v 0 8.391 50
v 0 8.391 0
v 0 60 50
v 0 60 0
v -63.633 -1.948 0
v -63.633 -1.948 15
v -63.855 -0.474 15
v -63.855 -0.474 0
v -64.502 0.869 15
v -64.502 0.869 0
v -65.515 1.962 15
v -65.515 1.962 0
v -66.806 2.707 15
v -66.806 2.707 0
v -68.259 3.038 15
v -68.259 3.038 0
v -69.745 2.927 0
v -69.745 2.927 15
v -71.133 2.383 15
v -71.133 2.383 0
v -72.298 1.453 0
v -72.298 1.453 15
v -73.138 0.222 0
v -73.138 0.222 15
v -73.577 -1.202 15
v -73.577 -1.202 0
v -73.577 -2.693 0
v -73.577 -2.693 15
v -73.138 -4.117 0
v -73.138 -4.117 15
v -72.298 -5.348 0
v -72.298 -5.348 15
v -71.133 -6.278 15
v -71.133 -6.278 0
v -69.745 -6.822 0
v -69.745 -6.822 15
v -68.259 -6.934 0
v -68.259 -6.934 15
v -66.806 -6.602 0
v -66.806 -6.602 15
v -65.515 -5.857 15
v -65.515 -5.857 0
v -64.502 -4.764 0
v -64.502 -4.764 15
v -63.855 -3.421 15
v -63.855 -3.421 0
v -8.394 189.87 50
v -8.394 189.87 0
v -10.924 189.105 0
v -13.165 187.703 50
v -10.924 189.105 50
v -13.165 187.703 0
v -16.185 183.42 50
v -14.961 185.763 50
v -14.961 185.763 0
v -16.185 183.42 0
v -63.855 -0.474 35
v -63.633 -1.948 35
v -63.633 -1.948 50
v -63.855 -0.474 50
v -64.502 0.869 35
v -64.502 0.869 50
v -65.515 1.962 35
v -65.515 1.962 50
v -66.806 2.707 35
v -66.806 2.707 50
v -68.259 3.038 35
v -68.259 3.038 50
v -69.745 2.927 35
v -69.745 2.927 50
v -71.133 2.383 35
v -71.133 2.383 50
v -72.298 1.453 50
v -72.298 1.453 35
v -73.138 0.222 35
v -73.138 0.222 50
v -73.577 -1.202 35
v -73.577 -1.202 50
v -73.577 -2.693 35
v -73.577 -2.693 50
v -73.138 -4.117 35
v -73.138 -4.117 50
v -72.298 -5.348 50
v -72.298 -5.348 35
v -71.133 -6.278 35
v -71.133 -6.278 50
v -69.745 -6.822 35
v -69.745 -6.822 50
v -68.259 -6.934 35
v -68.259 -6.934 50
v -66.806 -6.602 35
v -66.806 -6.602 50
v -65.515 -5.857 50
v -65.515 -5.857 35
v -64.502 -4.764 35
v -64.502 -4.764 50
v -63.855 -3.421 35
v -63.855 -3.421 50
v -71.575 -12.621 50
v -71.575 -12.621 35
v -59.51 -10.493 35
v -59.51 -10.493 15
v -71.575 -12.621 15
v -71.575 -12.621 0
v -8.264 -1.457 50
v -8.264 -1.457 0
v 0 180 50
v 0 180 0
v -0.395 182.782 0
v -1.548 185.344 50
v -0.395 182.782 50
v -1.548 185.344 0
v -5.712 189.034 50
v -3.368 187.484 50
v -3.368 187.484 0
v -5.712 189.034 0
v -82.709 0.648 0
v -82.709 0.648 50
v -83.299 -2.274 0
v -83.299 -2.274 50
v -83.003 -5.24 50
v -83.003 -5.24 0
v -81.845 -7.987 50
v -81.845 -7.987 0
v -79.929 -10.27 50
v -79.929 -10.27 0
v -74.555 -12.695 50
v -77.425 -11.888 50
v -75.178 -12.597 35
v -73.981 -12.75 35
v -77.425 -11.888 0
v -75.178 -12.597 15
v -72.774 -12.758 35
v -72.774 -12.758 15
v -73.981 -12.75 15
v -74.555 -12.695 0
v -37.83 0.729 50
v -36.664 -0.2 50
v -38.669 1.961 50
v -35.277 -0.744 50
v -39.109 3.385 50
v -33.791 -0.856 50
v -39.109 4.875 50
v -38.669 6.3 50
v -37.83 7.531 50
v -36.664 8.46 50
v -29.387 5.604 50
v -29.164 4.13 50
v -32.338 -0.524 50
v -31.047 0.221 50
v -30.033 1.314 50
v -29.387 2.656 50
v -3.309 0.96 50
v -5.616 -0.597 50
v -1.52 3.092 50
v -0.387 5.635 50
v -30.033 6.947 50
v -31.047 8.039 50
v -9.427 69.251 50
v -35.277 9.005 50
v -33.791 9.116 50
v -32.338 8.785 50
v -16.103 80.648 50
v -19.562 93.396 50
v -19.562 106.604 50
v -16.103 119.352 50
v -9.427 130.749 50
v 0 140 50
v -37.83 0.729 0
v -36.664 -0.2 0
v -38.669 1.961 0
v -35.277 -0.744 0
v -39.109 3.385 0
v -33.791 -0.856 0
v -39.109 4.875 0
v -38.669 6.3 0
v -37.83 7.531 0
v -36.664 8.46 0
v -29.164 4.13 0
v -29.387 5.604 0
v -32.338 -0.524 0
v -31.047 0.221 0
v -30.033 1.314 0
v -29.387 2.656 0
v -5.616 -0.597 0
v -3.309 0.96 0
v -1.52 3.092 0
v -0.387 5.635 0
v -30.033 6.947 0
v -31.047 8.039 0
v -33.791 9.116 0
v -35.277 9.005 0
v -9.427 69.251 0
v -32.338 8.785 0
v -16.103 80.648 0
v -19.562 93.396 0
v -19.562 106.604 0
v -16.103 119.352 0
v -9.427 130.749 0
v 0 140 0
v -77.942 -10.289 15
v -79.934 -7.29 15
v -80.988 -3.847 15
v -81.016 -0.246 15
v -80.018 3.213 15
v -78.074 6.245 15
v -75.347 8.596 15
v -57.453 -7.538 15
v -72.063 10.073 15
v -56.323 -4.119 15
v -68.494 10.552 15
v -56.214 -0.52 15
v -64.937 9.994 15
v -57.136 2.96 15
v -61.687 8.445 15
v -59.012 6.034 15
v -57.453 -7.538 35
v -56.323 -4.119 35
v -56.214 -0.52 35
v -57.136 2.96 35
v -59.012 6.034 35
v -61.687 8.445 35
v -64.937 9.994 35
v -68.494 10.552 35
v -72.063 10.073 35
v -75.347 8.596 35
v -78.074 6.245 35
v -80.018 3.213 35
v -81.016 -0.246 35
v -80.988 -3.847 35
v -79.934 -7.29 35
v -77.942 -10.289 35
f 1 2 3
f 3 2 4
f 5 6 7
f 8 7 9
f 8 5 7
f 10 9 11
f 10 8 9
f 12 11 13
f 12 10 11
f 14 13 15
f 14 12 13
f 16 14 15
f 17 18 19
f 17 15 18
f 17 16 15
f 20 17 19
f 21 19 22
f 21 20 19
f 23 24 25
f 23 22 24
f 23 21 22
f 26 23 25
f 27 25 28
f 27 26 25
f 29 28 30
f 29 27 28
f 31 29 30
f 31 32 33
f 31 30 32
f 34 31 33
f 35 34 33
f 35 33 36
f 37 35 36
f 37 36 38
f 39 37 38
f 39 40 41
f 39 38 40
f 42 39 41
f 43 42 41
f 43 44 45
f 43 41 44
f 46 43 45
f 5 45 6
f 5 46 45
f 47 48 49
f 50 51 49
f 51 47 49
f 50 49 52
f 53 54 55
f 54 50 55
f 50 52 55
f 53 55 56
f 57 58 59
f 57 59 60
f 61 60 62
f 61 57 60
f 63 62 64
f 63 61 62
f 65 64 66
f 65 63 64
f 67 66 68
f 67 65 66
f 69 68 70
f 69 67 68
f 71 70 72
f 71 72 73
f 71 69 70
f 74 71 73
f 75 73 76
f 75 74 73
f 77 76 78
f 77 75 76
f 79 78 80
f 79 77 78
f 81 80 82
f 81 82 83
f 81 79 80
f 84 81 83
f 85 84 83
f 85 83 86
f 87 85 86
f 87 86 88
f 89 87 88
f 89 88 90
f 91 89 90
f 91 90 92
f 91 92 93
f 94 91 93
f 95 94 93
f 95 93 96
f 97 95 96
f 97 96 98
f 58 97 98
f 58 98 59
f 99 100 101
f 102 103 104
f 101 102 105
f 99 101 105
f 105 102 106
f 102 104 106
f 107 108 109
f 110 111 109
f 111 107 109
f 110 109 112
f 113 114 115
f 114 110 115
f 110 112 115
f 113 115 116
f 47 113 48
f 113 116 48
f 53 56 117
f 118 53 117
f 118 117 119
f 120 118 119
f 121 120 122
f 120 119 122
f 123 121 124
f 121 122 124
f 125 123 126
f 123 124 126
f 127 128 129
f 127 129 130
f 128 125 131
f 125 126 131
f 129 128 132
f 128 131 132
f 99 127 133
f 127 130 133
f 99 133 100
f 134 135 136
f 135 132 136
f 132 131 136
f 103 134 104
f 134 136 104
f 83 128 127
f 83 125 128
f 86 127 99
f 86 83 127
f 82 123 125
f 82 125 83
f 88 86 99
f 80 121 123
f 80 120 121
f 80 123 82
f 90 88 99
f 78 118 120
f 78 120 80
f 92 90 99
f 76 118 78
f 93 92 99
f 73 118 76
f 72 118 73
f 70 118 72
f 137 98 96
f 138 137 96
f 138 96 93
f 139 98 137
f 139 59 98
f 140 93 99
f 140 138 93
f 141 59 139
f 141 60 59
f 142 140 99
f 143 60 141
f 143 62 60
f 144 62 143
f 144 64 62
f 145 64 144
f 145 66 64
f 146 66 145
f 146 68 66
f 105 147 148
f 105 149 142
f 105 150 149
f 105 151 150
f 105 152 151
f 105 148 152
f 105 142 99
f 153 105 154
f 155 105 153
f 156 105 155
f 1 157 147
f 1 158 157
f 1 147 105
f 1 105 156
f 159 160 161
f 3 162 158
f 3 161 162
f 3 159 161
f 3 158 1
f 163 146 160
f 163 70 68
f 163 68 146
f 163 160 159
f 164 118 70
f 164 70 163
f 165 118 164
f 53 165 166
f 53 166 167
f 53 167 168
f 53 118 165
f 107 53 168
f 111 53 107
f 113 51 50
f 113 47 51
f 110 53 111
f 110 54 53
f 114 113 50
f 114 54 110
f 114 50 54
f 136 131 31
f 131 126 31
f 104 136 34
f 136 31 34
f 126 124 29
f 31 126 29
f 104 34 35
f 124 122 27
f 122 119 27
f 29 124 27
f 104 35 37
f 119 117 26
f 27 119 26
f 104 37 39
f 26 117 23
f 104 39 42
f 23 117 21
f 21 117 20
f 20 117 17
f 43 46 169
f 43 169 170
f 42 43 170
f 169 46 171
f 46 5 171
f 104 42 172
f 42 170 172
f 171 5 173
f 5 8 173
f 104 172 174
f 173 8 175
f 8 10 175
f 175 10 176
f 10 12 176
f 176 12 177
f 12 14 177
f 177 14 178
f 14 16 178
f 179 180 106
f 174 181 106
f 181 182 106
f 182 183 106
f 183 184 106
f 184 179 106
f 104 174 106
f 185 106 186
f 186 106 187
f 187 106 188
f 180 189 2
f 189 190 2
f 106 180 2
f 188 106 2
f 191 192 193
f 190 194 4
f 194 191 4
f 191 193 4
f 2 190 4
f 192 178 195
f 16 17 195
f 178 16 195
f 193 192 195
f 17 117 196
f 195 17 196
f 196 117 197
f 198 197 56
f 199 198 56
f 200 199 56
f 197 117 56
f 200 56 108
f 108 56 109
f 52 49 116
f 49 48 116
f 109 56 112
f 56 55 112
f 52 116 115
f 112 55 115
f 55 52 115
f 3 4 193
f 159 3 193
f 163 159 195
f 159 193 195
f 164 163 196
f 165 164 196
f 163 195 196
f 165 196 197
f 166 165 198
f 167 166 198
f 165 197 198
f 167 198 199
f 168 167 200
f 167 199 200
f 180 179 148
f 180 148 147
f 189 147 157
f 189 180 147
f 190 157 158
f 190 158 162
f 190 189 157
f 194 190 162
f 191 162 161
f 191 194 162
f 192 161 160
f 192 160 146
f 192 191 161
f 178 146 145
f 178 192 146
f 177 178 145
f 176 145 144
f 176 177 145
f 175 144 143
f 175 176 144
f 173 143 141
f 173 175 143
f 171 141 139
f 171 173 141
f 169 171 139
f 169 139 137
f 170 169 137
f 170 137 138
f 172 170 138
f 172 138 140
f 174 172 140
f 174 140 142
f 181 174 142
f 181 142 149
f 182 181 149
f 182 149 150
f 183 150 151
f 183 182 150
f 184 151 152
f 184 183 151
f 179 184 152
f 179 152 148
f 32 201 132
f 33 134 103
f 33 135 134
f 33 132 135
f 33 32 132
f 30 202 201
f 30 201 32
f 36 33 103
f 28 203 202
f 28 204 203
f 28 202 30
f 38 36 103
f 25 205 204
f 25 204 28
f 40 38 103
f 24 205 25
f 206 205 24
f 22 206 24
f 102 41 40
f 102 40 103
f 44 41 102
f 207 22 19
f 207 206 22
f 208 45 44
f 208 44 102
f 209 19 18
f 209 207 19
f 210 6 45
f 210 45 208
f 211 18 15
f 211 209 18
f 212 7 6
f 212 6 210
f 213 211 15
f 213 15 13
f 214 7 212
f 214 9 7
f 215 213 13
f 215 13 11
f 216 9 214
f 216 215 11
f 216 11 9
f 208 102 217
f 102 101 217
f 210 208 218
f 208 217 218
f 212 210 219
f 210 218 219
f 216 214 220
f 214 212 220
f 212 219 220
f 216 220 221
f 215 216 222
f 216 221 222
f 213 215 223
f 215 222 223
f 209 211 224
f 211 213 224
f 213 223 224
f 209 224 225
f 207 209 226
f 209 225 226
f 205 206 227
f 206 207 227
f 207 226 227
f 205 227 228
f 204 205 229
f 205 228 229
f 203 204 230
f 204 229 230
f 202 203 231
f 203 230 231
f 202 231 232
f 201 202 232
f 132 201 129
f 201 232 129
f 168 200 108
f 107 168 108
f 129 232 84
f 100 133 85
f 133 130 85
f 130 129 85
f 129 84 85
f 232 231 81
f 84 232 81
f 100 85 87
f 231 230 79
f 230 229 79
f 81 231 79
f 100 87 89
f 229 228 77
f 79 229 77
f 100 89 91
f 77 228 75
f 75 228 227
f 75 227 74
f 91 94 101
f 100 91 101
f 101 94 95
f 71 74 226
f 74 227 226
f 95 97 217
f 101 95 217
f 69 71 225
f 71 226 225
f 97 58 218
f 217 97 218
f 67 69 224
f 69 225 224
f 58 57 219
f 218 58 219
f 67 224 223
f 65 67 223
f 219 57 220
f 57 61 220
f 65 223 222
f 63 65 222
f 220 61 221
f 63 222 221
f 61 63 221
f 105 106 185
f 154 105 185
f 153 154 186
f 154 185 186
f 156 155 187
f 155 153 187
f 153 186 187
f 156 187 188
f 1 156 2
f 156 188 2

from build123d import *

# Parameters (mm, degrees)
SKETCH1_R           = 5
BOSS_EXTRUDE1_DEPTH = 50
FILLET2_R           = 10
SKETCH2_R           = 12.5
CUT_EXTRUDE2_DEPTH  = 10


with BuildPart() as part:
    # Sketch1 → Boss-Extrude1 (new body)
    with BuildSketch(Plane.XY):
        with BuildLine():
            Line((0, 0), (0, 60))
            ThreePointArc((0, 60), (-20, 100), (0, 140))
            Line((0, 140), (0, 190))
            Line((0, 190), (-13.790104149, 190))
            Line((-13.790104149, 190), (-88.632697771, -15.62833599))
            Line((-88.632697771, -15.62833599), (0, 0))
        make_face()
        with Locations((-68.632697771, -1.947530257)):
            Circle(SKETCH1_R, mode=Mode.SUBTRACT)
        with Locations((-34.164426416, 4.130155961)):
            Circle(SKETCH1_R, mode=Mode.SUBTRACT)
    extrude(amount=BOSS_EXTRUDE1_DEPTH)

    # Fillet2
    # the kernel refuses this fillet: 10 mm, written as the material it takes off along each edge
    with BuildSketch(Plane(origin=(0, 0, -20.977490779), x_dir=(0, 1, 0), z_dir=(0, 0, 1))) as fillet2_piece_1:
        with BuildLine():
            CenterArc((FILLET2_R * 0.839099631177, FILLET2_R), FILLET2_R, 190, 80)
            Line((-FILLET2_R * 0.145708121835, FILLET2_R * 0.826351822333), (0, 0))
            Line((0, 0), (FILLET2_R * 0.839099631177, 0))
        make_face()
    extrude(amount=91.954981559, mode=Mode.SUBTRACT)
    with BuildSketch(Plane(origin=(-88.632697771, -15.62833599, -43.301270189), x_dir=(0.34202014332567615, 0.9396926207859058, 0), z_dir=(0, 0, 1))) as fillet2_piece_2:
        with BuildLine():
            CenterArc((FILLET2_R * 1.73205080757, -FILLET2_R), FILLET2_R, 90, 120)
            Line((FILLET2_R * 0.866025403784, -FILLET2_R * 1.5), (0, 0))
            Line((0, 0), (FILLET2_R * 1.73205080757, 0))
        make_face()
    extrude(amount=136.602540378, mode=Mode.SUBTRACT)
    with BuildSketch(Plane(origin=(-13.790104149, 190, -17.505188455), x_dir=(1, 0, 0), z_dir=(0, 0, 1))) as fillet2_piece_3:
        with BuildLine():
            CenterArc((FILLET2_R * 0.70020753821, -FILLET2_R), FILLET2_R, 90, 70)
            Line((-FILLET2_R * 0.239485082576, -FILLET2_R * 0.657979856674), (0, 0))
            Line((0, 0), (FILLET2_R * 0.70020753821, 0))
        make_face()
    extrude(amount=85.01037691, mode=Mode.SUBTRACT)
    with BuildSketch(Plane(origin=(0, 190, -25), x_dir=(0, -1, 0), z_dir=(0, 0, 1))) as fillet2_piece_4:
        with BuildLine():
            CenterArc((FILLET2_R, -FILLET2_R), FILLET2_R, 90, 90)
            Line((0, -FILLET2_R), (0, 0))
            Line((0, 0), (FILLET2_R, 0))
        make_face()
    extrude(amount=100, mode=Mode.SUBTRACT)

    # Sketch2 → Cut-Extrude2 (cut, symmetric)
    with BuildSketch(Plane.XY.offset(25)):
        with Locations((-68.632697771, -1.947530257)):
            Circle(SKETCH2_R)
    extrude(amount=CUT_EXTRUDE2_DEPTH, both=True, mode=Mode.SUBTRACT)


solid = part.part
